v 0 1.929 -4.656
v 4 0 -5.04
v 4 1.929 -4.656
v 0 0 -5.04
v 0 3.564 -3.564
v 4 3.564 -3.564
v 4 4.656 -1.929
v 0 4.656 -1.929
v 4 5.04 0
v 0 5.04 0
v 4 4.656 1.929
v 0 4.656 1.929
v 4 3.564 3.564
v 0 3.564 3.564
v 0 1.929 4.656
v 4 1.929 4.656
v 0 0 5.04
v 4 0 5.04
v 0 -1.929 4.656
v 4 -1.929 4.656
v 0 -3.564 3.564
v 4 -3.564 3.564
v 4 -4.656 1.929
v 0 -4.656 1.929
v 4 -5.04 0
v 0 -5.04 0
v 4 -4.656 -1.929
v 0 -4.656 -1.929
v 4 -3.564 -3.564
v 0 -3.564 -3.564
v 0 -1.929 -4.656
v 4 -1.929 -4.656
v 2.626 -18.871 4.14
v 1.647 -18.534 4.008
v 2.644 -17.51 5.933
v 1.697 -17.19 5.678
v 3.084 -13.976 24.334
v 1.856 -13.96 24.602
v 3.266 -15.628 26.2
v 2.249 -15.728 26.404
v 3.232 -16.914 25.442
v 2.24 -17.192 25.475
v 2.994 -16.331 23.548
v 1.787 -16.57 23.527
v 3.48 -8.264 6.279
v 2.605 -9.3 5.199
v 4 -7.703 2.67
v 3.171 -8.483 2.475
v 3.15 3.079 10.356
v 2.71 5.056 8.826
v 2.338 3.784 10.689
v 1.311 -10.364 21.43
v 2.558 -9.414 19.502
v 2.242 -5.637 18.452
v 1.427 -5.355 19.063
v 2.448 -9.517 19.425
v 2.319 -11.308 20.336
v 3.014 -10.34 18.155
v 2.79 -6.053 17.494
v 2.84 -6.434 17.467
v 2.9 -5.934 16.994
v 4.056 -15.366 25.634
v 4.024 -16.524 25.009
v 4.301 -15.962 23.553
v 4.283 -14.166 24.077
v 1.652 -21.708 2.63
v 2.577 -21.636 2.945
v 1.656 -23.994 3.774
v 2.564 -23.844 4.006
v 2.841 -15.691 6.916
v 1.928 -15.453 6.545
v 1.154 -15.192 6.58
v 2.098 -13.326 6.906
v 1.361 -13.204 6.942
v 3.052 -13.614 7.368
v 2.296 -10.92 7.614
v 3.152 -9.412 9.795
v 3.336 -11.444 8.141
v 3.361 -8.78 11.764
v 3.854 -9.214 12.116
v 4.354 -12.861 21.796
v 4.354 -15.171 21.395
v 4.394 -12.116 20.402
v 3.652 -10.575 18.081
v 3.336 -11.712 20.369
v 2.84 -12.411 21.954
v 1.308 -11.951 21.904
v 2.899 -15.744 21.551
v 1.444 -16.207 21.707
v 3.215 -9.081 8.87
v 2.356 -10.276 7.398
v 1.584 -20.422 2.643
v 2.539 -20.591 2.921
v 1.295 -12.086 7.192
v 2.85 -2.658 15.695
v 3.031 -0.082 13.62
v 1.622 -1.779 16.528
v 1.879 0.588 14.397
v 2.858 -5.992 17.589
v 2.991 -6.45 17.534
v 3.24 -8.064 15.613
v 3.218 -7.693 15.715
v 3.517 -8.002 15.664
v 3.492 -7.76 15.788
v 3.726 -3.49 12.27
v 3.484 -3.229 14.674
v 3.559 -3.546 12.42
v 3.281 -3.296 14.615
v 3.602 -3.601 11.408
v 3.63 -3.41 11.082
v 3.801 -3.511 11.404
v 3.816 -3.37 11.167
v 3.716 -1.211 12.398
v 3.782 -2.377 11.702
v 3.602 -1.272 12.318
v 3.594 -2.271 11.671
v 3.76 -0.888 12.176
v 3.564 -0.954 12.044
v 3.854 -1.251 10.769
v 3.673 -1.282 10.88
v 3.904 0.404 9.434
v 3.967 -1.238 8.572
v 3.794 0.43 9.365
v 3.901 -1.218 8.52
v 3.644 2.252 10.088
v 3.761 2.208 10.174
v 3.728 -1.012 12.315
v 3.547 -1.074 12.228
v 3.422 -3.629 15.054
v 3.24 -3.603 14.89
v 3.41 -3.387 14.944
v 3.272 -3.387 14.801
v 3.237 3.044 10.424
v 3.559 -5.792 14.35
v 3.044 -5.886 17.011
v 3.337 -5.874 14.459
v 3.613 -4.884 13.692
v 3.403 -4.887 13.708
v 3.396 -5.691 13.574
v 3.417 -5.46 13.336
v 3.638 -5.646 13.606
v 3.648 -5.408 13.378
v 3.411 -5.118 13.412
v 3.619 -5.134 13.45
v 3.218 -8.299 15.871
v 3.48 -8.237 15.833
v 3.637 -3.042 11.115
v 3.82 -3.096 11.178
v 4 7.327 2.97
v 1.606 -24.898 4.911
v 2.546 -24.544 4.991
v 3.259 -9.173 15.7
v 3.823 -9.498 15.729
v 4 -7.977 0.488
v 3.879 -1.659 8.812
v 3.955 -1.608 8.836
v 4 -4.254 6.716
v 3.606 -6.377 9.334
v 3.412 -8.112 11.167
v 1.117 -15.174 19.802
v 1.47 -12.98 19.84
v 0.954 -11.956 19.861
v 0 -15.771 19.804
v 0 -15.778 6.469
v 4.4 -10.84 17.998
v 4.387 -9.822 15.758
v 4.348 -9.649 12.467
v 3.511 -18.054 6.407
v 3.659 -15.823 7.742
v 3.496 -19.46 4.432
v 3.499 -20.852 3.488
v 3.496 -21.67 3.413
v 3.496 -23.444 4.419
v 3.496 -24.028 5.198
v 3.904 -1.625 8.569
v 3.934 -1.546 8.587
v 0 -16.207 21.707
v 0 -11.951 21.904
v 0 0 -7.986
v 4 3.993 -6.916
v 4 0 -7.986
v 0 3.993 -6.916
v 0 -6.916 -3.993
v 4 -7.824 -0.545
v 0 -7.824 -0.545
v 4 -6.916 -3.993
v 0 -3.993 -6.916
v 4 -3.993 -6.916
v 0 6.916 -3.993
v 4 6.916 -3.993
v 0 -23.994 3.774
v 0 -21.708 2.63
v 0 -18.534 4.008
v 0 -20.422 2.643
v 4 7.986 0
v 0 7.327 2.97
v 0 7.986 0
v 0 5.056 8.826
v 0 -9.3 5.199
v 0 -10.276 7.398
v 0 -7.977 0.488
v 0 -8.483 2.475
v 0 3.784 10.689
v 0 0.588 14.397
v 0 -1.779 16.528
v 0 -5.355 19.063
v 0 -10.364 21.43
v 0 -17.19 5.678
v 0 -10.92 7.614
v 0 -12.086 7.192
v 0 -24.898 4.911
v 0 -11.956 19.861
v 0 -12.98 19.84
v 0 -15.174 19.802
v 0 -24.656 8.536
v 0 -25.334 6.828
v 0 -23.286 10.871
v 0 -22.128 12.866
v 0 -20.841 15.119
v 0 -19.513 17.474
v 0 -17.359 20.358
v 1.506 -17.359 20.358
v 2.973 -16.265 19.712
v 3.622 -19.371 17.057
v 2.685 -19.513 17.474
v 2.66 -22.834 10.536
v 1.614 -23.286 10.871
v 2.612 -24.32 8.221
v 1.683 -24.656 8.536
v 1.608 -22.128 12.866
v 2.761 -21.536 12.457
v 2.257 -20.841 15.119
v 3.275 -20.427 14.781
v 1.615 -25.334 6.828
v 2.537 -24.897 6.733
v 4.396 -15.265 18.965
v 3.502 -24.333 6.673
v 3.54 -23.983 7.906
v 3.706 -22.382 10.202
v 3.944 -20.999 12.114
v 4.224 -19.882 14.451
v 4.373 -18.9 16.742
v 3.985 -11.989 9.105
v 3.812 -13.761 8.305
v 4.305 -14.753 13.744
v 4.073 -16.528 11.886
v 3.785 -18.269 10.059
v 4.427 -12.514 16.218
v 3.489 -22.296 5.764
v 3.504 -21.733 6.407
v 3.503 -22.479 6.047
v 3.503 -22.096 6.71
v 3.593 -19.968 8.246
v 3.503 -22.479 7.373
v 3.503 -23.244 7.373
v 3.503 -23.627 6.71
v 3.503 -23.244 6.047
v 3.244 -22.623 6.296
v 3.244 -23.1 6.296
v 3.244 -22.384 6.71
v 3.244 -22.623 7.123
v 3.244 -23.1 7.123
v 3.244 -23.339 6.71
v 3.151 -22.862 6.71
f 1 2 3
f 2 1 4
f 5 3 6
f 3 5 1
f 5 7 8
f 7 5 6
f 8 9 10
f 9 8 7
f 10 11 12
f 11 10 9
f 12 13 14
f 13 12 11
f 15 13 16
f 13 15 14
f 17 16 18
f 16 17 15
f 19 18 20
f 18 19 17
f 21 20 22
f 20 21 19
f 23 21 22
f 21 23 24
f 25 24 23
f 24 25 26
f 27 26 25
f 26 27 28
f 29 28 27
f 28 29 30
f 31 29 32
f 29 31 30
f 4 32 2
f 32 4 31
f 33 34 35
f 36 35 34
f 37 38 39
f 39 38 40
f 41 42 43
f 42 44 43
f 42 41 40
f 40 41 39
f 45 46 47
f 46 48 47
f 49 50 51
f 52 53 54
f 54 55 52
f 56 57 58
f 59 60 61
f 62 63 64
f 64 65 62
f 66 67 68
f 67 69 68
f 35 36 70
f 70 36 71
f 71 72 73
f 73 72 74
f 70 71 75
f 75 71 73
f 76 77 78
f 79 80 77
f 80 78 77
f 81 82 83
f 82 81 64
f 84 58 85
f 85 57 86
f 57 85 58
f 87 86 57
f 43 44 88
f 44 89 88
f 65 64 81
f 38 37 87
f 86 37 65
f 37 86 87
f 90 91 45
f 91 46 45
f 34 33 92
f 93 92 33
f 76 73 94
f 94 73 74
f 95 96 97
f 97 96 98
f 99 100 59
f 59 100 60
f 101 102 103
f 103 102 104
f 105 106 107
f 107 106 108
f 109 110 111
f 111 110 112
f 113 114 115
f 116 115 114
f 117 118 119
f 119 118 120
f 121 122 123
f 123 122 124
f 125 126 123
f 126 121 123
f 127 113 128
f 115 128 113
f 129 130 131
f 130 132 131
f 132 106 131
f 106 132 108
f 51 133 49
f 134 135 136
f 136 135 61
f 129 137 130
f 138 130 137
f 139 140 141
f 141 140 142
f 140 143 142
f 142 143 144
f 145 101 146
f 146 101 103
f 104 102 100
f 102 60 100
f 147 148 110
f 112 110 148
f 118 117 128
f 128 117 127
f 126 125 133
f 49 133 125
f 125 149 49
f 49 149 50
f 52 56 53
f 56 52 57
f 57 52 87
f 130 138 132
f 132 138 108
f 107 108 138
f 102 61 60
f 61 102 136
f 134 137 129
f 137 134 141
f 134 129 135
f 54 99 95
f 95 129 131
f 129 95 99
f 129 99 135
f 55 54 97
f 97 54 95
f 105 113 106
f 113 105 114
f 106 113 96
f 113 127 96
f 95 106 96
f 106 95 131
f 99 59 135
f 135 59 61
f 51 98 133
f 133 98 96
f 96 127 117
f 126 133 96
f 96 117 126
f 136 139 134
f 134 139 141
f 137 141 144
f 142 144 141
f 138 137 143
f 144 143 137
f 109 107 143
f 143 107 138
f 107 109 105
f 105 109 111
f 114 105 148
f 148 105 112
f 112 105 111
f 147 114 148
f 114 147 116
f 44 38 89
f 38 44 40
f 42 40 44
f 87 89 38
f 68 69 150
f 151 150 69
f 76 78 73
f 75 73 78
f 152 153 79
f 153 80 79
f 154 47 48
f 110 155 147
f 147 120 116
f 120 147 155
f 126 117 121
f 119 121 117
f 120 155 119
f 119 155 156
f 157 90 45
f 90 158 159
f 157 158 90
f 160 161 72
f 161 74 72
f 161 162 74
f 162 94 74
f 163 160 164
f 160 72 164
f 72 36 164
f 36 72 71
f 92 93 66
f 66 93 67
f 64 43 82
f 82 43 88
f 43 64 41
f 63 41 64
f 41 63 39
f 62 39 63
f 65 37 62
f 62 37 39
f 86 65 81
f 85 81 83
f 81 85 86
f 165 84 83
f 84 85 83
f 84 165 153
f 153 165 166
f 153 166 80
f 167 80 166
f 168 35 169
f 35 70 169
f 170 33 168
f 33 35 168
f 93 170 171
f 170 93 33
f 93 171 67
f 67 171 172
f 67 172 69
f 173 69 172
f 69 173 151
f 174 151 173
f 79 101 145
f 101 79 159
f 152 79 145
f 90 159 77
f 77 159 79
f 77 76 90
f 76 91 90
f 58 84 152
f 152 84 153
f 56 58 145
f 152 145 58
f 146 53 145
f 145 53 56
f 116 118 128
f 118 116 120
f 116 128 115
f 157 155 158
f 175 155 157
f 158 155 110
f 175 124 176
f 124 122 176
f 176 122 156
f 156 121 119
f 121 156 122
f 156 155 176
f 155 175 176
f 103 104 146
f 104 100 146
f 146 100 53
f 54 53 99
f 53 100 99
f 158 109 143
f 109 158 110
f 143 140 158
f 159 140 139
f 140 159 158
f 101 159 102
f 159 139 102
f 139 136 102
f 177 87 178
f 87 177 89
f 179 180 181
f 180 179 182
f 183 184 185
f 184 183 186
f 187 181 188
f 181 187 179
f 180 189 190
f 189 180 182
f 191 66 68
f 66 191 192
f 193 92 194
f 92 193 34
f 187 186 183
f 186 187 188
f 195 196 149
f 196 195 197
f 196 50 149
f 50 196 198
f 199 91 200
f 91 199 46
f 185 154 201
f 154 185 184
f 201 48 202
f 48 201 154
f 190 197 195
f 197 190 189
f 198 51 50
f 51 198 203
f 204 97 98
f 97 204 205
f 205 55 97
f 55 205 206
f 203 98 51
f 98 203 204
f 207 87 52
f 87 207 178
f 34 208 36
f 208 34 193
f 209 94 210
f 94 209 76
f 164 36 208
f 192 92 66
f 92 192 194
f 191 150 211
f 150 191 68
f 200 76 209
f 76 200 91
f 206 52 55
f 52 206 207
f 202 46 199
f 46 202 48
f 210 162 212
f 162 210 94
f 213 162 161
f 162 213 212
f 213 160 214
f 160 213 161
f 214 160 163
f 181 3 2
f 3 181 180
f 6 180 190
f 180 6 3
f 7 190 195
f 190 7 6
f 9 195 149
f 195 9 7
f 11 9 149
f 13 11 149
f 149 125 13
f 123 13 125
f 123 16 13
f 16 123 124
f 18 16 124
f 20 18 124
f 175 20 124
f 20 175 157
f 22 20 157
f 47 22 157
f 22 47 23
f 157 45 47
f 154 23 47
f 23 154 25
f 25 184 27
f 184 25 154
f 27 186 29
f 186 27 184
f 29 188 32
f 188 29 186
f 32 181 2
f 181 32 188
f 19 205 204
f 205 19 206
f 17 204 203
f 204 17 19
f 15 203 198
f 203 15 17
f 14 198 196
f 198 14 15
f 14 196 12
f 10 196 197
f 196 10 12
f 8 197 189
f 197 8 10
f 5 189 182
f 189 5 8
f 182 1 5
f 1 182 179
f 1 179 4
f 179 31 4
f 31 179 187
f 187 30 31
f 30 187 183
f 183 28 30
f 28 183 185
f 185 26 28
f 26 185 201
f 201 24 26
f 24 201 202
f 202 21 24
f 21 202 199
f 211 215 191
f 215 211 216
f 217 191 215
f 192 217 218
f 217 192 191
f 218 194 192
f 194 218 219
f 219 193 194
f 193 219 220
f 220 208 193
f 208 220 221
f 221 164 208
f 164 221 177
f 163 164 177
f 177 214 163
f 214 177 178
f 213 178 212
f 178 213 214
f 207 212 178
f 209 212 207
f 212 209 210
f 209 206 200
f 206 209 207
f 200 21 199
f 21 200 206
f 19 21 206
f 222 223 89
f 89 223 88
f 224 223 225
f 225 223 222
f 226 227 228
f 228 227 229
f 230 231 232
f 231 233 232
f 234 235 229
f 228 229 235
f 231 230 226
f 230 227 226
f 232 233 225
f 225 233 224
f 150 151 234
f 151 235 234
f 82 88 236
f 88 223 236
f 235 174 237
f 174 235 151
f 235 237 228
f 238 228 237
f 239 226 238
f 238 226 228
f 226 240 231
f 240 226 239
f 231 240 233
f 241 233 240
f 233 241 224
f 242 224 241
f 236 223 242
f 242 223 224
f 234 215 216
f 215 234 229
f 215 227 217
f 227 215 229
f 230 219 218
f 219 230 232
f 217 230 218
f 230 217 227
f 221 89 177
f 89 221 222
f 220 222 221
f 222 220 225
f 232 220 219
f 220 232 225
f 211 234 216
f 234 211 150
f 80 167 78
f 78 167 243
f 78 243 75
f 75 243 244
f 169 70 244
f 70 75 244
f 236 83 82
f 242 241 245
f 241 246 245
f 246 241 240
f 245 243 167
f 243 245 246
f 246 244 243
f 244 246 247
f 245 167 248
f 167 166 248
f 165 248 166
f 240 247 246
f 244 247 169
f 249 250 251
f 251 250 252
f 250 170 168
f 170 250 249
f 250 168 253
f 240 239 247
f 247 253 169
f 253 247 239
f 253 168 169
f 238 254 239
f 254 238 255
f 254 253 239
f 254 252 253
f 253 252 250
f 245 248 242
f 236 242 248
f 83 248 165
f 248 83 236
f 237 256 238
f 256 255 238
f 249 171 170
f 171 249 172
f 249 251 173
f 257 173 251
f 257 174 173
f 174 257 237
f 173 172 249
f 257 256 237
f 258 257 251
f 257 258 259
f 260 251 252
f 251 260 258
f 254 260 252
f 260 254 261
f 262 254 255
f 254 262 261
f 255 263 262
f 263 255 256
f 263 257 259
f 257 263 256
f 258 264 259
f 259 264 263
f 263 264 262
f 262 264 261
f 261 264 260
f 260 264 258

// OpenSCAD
use <../lib.scad>
use <s/10350s01.scad>
function ldraw_lib__10350() = [
// 0 ~Animal Horse Poseable Head Left
// 0 Name: 10350.dat
// 0 Author: Philippe Hurbain [Philo]
// 0 !LDRAW_ORG Part UPDATE 2013-02
// 0 !LICENSE Licensed under CC BY 4.0 : see CAreadme.txt
// 
// 0 BFC CERTIFY CCW
  [0,"BFC","CERTIFY"],
  [0,"BFC","CCW"],
// 
// 0 !HISTORY 2013-11-18 {LEGO Digital Designer} Original part shape
// 0 !HISTORY 2013-11-18 [Philo] File preparation for LDraw Parts Tracker
// 0 !HISTORY 2013-12-23 [PTadmin] Official Update 2013-02
// 
// 
// 1 16 0 0 0 1 0 0 0 1 0 0 0 1 s\10350s01.dat
  [1,16,0,0,0,1,0,0,0,1,0,0,0,1, ldraw_lib__s__10350s01()],
// 0 // Patternable areas
// 0 // Head Top
// 3 16 3.764 -50.896 -43.398 7.433 -49.279 -40.662 3.61 -54.268 -40.518
  [3,16,3.764,-50.896,-43.398,7.433,-49.279,-40.662,3.61,-54.268,-40.518],
// 3 16 3.61 -54.268 -40.518 7.433 -49.279 -40.662 7.247 -53.878 -39.361
  [3,16,3.61,-54.268,-40.518,7.433,-49.279,-40.662,7.247,-53.878,-39.361],
// 3 16 9.054 -42.642 -48.427 7.433 -49.279 -40.662 6.713 -43.686 -48.782
  [3,16,9.054,-42.642,-48.427,7.433,-49.279,-40.662,6.713,-43.686,-48.782],
// 3 16 6.713 -43.686 -48.782 7.433 -49.279 -40.662 3.764 -50.896 -43.398
  [3,16,6.713,-43.686,-48.782,7.433,-49.279,-40.662,3.764,-50.896,-43.398],
// 3 16 6.65 -26.341 -57.085 4.036 -27.178 -58.214 6.53 -20.552 -60.799
  [3,16,6.65,-26.341,-57.085,4.036,-27.178,-58.214,6.53,-20.552,-60.799],
// 3 16 6.53 -20.552 -60.799 4.036 -27.178 -58.214 4.208 -21.339 -61.641
  [3,16,6.53,-20.552,-60.799,4.036,-27.178,-58.214,4.208,-21.339,-61.641],
// 3 16 4.02 -32.164 -55.32 6.902 -31.143 -53.84 5.642 -37.797 -52.103
  [3,16,4.02,-32.164,-55.32,6.902,-31.143,-53.84,5.642,-37.797,-52.103],
// 3 16 6.902 -31.143 -53.84 8.187 -36.952 -51.068 5.642 -37.797 -52.103
  [3,16,6.902,-31.143,-53.84,8.187,-36.952,-51.068,5.642,-37.797,-52.103],
// 3 16 4.037 -17.07 -63.336 6.342 -16.832 -62.243 4.208 -21.339 -61.641
  [3,16,4.037,-17.07,-63.336,6.342,-16.832,-62.243,4.208,-21.339,-61.641],
// 3 16 6.53 -20.552 -60.799 4.208 -21.339 -61.641 6.342 -16.832 -62.243
  [3,16,6.53,-20.552,-60.799,4.208,-21.339,-61.641,6.342,-16.832,-62.243],
// 3 16 6.902 -31.143 -53.84 4.02 -32.164 -55.32 6.65 -26.341 -57.085
  [3,16,6.902,-31.143,-53.84,4.02,-32.164,-55.32,6.65,-26.341,-57.085],
// 3 16 4.02 -32.164 -55.32 4.036 -27.178 -58.214 6.65 -26.341 -57.085
  [3,16,4.02,-32.164,-55.32,4.036,-27.178,-58.214,6.65,-26.341,-57.085],
// 3 16 5.642 -37.797 -52.103 8.187 -36.952 -51.068 6.713 -43.686 -48.782
  [3,16,5.642,-37.797,-52.103,8.187,-36.952,-51.068,6.713,-43.686,-48.782],
// 3 16 6.713 -43.686 -48.782 8.187 -36.952 -51.068 9.054 -42.642 -48.427
  [3,16,6.713,-43.686,-48.782,8.187,-36.952,-51.068,9.054,-42.642,-48.427],
// 3 16 4.015 -12.278 -62.245 6.366 -12.477 -61.36 4.037 -17.07 -63.336
  [3,16,4.015,-12.278,-62.245,6.366,-12.477,-61.36,4.037,-17.07,-63.336],
// 3 16 6.366 -12.477 -61.36 6.342 -16.832 -62.243 4.037 -17.07 -63.336
  [3,16,6.366,-12.477,-61.36,6.342,-16.832,-62.243,4.037,-17.07,-63.336],
// 3 16 10.884 -53.488 -37.927 7.247 -53.878 -39.361 10.99 -47.412 -38.163
  [3,16,10.884,-53.488,-37.927,7.247,-53.878,-39.361,10.99,-47.412,-38.163],
// 3 16 7.247 -53.878 -39.361 7.433 -49.279 -40.662 10.99 -47.412 -38.163
  [3,16,7.247,-53.878,-39.361,7.433,-49.279,-40.662,10.99,-47.412,-38.163],
// 4 16 6.342 -16.832 -62.243 6.366 -12.477 -61.36 8.74 -12.994 -60.071 8.754 -16.683 -60.832
  [4,16,6.342,-16.832,-62.243,6.366,-12.477,-61.36,8.74,-12.994,-60.071,8.754,-16.683,-60.832],
// 3 16 6.342 -16.832 -62.243 8.754 -16.683 -60.832 6.53 -20.552 -60.799
  [3,16,6.342,-16.832,-62.243,8.754,-16.683,-60.832,6.53,-20.552,-60.799],
// 3 16 8.851 -19.764 -59.957 6.53 -20.552 -60.799 8.754 -16.683 -60.832
  [3,16,8.851,-19.764,-59.957,6.53,-20.552,-60.799,8.754,-16.683,-60.832],
// 3 16 9.264 -25.505 -55.956 6.65 -26.341 -57.085 8.851 -19.764 -59.957
  [3,16,9.264,-25.505,-55.956,6.65,-26.341,-57.085,8.851,-19.764,-59.957],
// 3 16 8.851 -19.764 -59.957 6.65 -26.341 -57.085 6.53 -20.552 -60.799
  [3,16,8.851,-19.764,-59.957,6.65,-26.341,-57.085,6.53,-20.552,-60.799],
// 4 16 9.264 -25.505 -55.956 9.859 -30.285 -52.497 6.902 -31.143 -53.84 6.65 -26.341 -57.085
  [4,16,9.264,-25.505,-55.956,9.859,-30.285,-52.497,6.902,-31.143,-53.84,6.65,-26.341,-57.085],
// 3 16 6.902 -31.143 -53.84 9.859 -30.285 -52.497 8.187 -36.952 -51.068
  [3,16,6.902,-31.143,-53.84,9.859,-30.285,-52.497,8.187,-36.952,-51.068],
// 3 16 10.56 -36.128 -49.704 8.187 -36.952 -51.068 9.859 -30.285 -52.497
  [3,16,10.56,-36.128,-49.704,8.187,-36.952,-51.068,9.859,-30.285,-52.497],
// 3 16 8.187 -36.952 -51.068 10.56 -36.128 -49.704 9.054 -42.642 -48.427
  [3,16,8.187,-36.952,-51.068,10.56,-36.128,-49.704,9.054,-42.642,-48.427],
// 3 16 10.933 -41.854 -47.251 9.054 -42.642 -48.427 10.56 -36.128 -49.704
  [3,16,10.933,-41.854,-47.251,9.054,-42.642,-48.427,10.56,-36.128,-49.704],
// 3 16 10.99 -47.412 -38.163 7.433 -49.279 -40.662 10.933 -41.854 -47.251
  [3,16,10.99,-47.412,-38.163,7.433,-49.279,-40.662,10.933,-41.854,-47.251],
// 3 16 10.933 -41.854 -47.251 7.433 -49.279 -40.662 9.054 -42.642 -48.427
  [3,16,10.933,-41.854,-47.251,7.433,-49.279,-40.662,9.054,-42.642,-48.427],
// 2 24 3.61 -54.268 -40.518 3.764 -50.896 -43.398
  [2,24,3.61,-54.268,-40.518,3.764,-50.896,-43.398],
// 2 24 3.764 -50.896 -43.398 6.713 -43.686 -48.782
  [2,24,3.764,-50.896,-43.398,6.713,-43.686,-48.782],
// 2 24 4.02 -32.164 -55.32 5.642 -37.797 -52.103
  [2,24,4.02,-32.164,-55.32,5.642,-37.797,-52.103],
// 2 24 6.713 -43.686 -48.782 5.642 -37.797 -52.103
  [2,24,6.713,-43.686,-48.782,5.642,-37.797,-52.103],
// 4 16 0 -17.07 -63.336 4.037 -17.07 -63.336 4.208 -21.339 -61.641 0 -21.339 -61.641
  [4,16,0,-17.07,-63.336,4.037,-17.07,-63.336,4.208,-21.339,-61.641,0,-21.339,-61.641],
// 4 16 0 -21.339 -61.641 4.208 -21.339 -61.641 4.036 -27.178 -58.214 0 -27.178 -58.214
  [4,16,0,-21.339,-61.641,4.208,-21.339,-61.641,4.036,-27.178,-58.214,0,-27.178,-58.214],
// 4 16 0 -32.164 -55.32 4.02 -32.164 -55.32 5.642 -37.797 -52.103 0 -37.797 -52.103
  [4,16,0,-32.164,-55.32,4.02,-32.164,-55.32,5.642,-37.797,-52.103,0,-37.797,-52.103],
// 4 16 0 -27.178 -58.214 4.036 -27.178 -58.214 4.02 -32.164 -55.32 0 -32.164 -55.32
  [4,16,0,-27.178,-58.214,4.036,-27.178,-58.214,4.02,-32.164,-55.32,0,-32.164,-55.32],
// 4 16 0 -50.896 -43.398 3.764 -50.896 -43.398 3.61 -54.268 -40.518 0 -54.268 -40.518
  [4,16,0,-50.896,-43.398,3.764,-50.896,-43.398,3.61,-54.268,-40.518,0,-54.268,-40.518],
// 4 16 0 -43.686 -48.782 6.713 -43.686 -48.782 3.764 -50.896 -43.398 0 -50.896 -43.398
  [4,16,0,-43.686,-48.782,6.713,-43.686,-48.782,3.764,-50.896,-43.398,0,-50.896,-43.398],
// 4 16 0 -37.797 -52.103 5.642 -37.797 -52.103 6.713 -43.686 -48.782 0 -43.686 -48.782
  [4,16,0,-37.797,-52.103,5.642,-37.797,-52.103,6.713,-43.686,-48.782,0,-43.686,-48.782],
// 4 16 0 -12.278 -62.245 4.015 -12.278 -62.245 4.037 -17.07 -63.336 0 -17.07 -63.336
  [4,16,0,-12.278,-62.245,4.015,-12.278,-62.245,4.037,-17.07,-63.336,0,-17.07,-63.336],
// 5 24 3.764 -50.896 -43.398 7.433 -49.279 -40.662 3.61 -54.268 -40.518 6.713 -43.686 -48.782
  [5,24,3.764,-50.896,-43.398,7.433,-49.279,-40.662,3.61,-54.268,-40.518,6.713,-43.686,-48.782],
// 5 24 7.433 -49.279 -40.662 3.61 -54.268 -40.518 3.764 -50.896 -43.398 7.247 -53.878 -39.361
  [5,24,7.433,-49.279,-40.662,3.61,-54.268,-40.518,3.764,-50.896,-43.398,7.247,-53.878,-39.361],
// 5 24 7.433 -49.279 -40.662 7.247 -53.878 -39.361 3.61 -54.268 -40.518 10.99 -47.412 -38.163
  [5,24,7.433,-49.279,-40.662,7.247,-53.878,-39.361,3.61,-54.268,-40.518,10.99,-47.412,-38.163],
// 5 24 9.054 -42.642 -48.427 7.433 -49.279 -40.662 6.713 -43.686 -48.782 10.933 -41.854 -47.251
  [5,24,9.054,-42.642,-48.427,7.433,-49.279,-40.662,6.713,-43.686,-48.782,10.933,-41.854,-47.251],
// 5 24 7.433 -49.279 -40.662 6.713 -43.686 -48.782 9.054 -42.642 -48.427 3.764 -50.896 -43.398
  [5,24,7.433,-49.279,-40.662,6.713,-43.686,-48.782,9.054,-42.642,-48.427,3.764,-50.896,-43.398],
// 5 24 6.713 -43.686 -48.782 9.054 -42.642 -48.427 7.433 -49.279 -40.662 8.187 -36.952 -51.068
  [5,24,6.713,-43.686,-48.782,9.054,-42.642,-48.427,7.433,-49.279,-40.662,8.187,-36.952,-51.068],
// 5 24 6.65 -26.341 -57.085 4.036 -27.178 -58.214 6.53 -20.552 -60.799 4.02 -32.164 -55.32
  [5,24,6.65,-26.341,-57.085,4.036,-27.178,-58.214,6.53,-20.552,-60.799,4.02,-32.164,-55.32],
// 5 24 4.036 -27.178 -58.214 6.53 -20.552 -60.799 6.65 -26.341 -57.085 4.208 -21.339 -61.641
  [5,24,4.036,-27.178,-58.214,6.53,-20.552,-60.799,6.65,-26.341,-57.085,4.208,-21.339,-61.641],
// 5 24 6.53 -20.552 -60.799 6.65 -26.341 -57.085 4.036 -27.178 -58.214 8.851 -19.764 -59.957
  [5,24,6.53,-20.552,-60.799,6.65,-26.341,-57.085,4.036,-27.178,-58.214,8.851,-19.764,-59.957],
// 5 24 4.036 -27.178 -58.214 4.208 -21.339 -61.641 6.53 -20.552 -60.799 0 -21.339 -61.641
  [5,24,4.036,-27.178,-58.214,4.208,-21.339,-61.641,6.53,-20.552,-60.799,0,-21.339,-61.641],
// 5 24 4.208 -21.339 -61.641 6.53 -20.552 -60.799 4.036 -27.178 -58.214 6.342 -16.832 -62.243
  [5,24,4.208,-21.339,-61.641,6.53,-20.552,-60.799,4.036,-27.178,-58.214,6.342,-16.832,-62.243],
// 5 24 4.02 -32.164 -55.32 6.902 -31.143 -53.84 5.642 -37.797 -52.103 6.65 -26.341 -57.085
  [5,24,4.02,-32.164,-55.32,6.902,-31.143,-53.84,5.642,-37.797,-52.103,6.65,-26.341,-57.085],
// 5 24 6.902 -31.143 -53.84 5.642 -37.797 -52.103 4.02 -32.164 -55.32 8.187 -36.952 -51.068
  [5,24,6.902,-31.143,-53.84,5.642,-37.797,-52.103,4.02,-32.164,-55.32,8.187,-36.952,-51.068],
// 5 24 6.902 -31.143 -53.84 8.187 -36.952 -51.068 5.642 -37.797 -52.103 9.859 -30.285 -52.497
  [5,24,6.902,-31.143,-53.84,8.187,-36.952,-51.068,5.642,-37.797,-52.103,9.859,-30.285,-52.497],
// 5 24 8.187 -36.952 -51.068 5.642 -37.797 -52.103 6.902 -31.143 -53.84 6.713 -43.686 -48.782
  [5,24,8.187,-36.952,-51.068,5.642,-37.797,-52.103,6.902,-31.143,-53.84,6.713,-43.686,-48.782],
// 5 24 4.037 -17.07 -63.336 6.342 -16.832 -62.243 4.208 -21.339 -61.641 6.366 -12.477 -61.36
  [5,24,4.037,-17.07,-63.336,6.342,-16.832,-62.243,4.208,-21.339,-61.641,6.366,-12.477,-61.36],
// 5 24 6.342 -16.832 -62.243 4.208 -21.339 -61.641 4.037 -17.07 -63.336 6.53 -20.552 -60.799
  [5,24,6.342,-16.832,-62.243,4.208,-21.339,-61.641,4.037,-17.07,-63.336,6.53,-20.552,-60.799],
// 5 24 4.208 -21.339 -61.641 4.037 -17.07 -63.336 6.342 -16.832 -62.243 0 -17.07 -63.336
  [5,24,4.208,-21.339,-61.641,4.037,-17.07,-63.336,6.342,-16.832,-62.243,0,-17.07,-63.336],
// 5 24 6.342 -16.832 -62.243 6.53 -20.552 -60.799 4.208 -21.339 -61.641 8.754 -16.683 -60.832
  [5,24,6.342,-16.832,-62.243,6.53,-20.552,-60.799,4.208,-21.339,-61.641,8.754,-16.683,-60.832],
// 5 24 4.02 -32.164 -55.32 6.65 -26.341 -57.085 6.902 -31.143 -53.84 4.036 -27.178 -58.214
  [5,24,4.02,-32.164,-55.32,6.65,-26.341,-57.085,6.902,-31.143,-53.84,4.036,-27.178,-58.214],
// 5 24 6.65 -26.341 -57.085 6.902 -31.143 -53.84 4.02 -32.164 -55.32 9.264 -25.505 -55.956
  [5,24,6.65,-26.341,-57.085,6.902,-31.143,-53.84,4.02,-32.164,-55.32,9.264,-25.505,-55.956],
// 5 24 4.02 -32.164 -55.32 4.036 -27.178 -58.214 6.65 -26.341 -57.085 0 -27.178 -58.214
  [5,24,4.02,-32.164,-55.32,4.036,-27.178,-58.214,6.65,-26.341,-57.085,0,-27.178,-58.214],
// 5 24 8.187 -36.952 -51.068 6.713 -43.686 -48.782 5.642 -37.797 -52.103 9.054 -42.642 -48.427
  [5,24,8.187,-36.952,-51.068,6.713,-43.686,-48.782,5.642,-37.797,-52.103,9.054,-42.642,-48.427],
// 5 24 8.187 -36.952 -51.068 9.054 -42.642 -48.427 6.713 -43.686 -48.782 10.56 -36.128 -49.704
  [5,24,8.187,-36.952,-51.068,9.054,-42.642,-48.427,6.713,-43.686,-48.782,10.56,-36.128,-49.704],
// 5 24 6.366 -12.477 -61.36 4.037 -17.07 -63.336 4.015 -12.278 -62.245 6.342 -16.832 -62.243
  [5,24,6.366,-12.477,-61.36,4.037,-17.07,-63.336,4.015,-12.278,-62.245,6.342,-16.832,-62.243],
// 5 24 4.037 -17.07 -63.336 4.015 -12.278 -62.245 6.366 -12.477 -61.36 0 -12.278 -62.245
  [5,24,4.037,-17.07,-63.336,4.015,-12.278,-62.245,6.366,-12.477,-61.36,0,-12.278,-62.245],
// 5 24 6.366 -12.477 -61.36 6.342 -16.832 -62.243 4.037 -17.07 -63.336 8.74 -12.994 -60.071
  [5,24,6.366,-12.477,-61.36,6.342,-16.832,-62.243,4.037,-17.07,-63.336,8.74,-12.994,-60.071],
// 5 24 7.247 -53.878 -39.361 10.99 -47.412 -38.163 10.884 -53.488 -37.927 7.433 -49.279 -40.662
  [5,24,7.247,-53.878,-39.361,10.99,-47.412,-38.163,10.884,-53.488,-37.927,7.433,-49.279,-40.662],
// 5 24 7.433 -49.279 -40.662 10.99 -47.412 -38.163 7.247 -53.878 -39.361 10.933 -41.854 -47.251
  [5,24,7.433,-49.279,-40.662,10.99,-47.412,-38.163,7.247,-53.878,-39.361,10.933,-41.854,-47.251],
// 5 24 8.754 -16.683 -60.832 6.342 -16.832 -62.243 8.74 -12.994 -60.071 6.53 -20.552 -60.799
  [5,24,8.754,-16.683,-60.832,6.342,-16.832,-62.243,8.74,-12.994,-60.071,6.53,-20.552,-60.799],
// 5 24 8.754 -16.683 -60.832 6.53 -20.552 -60.799 6.342 -16.832 -62.243 8.851 -19.764 -59.957
  [5,24,8.754,-16.683,-60.832,6.53,-20.552,-60.799,6.342,-16.832,-62.243,8.851,-19.764,-59.957],
// 5 24 8.851 -19.764 -59.957 6.53 -20.552 -60.799 8.754 -16.683 -60.832 6.65 -26.341 -57.085
  [5,24,8.851,-19.764,-59.957,6.53,-20.552,-60.799,8.754,-16.683,-60.832,6.65,-26.341,-57.085],
// 5 24 9.264 -25.505 -55.956 6.65 -26.341 -57.085 8.851 -19.764 -59.957 6.902 -31.143 -53.84
  [5,24,9.264,-25.505,-55.956,6.65,-26.341,-57.085,8.851,-19.764,-59.957,6.902,-31.143,-53.84],
// 5 24 6.65 -26.341 -57.085 8.851 -19.764 -59.957 9.264 -25.505 -55.956 6.53 -20.552 -60.799
  [5,24,6.65,-26.341,-57.085,8.851,-19.764,-59.957,9.264,-25.505,-55.956,6.53,-20.552,-60.799],
// 5 24 9.859 -30.285 -52.497 6.902 -31.143 -53.84 9.264 -25.505 -55.956 8.187 -36.952 -51.068
  [5,24,9.859,-30.285,-52.497,6.902,-31.143,-53.84,9.264,-25.505,-55.956,8.187,-36.952,-51.068],
// 5 24 9.859 -30.285 -52.497 8.187 -36.952 -51.068 6.902 -31.143 -53.84 10.56 -36.128 -49.704
  [5,24,9.859,-30.285,-52.497,8.187,-36.952,-51.068,6.902,-31.143,-53.84,10.56,-36.128,-49.704],
// 5 24 10.56 -36.128 -49.704 8.187 -36.952 -51.068 9.859 -30.285 -52.497 9.054 -42.642 -48.427
  [5,24,10.56,-36.128,-49.704,8.187,-36.952,-51.068,9.859,-30.285,-52.497,9.054,-42.642,-48.427],
// 5 24 10.56 -36.128 -49.704 9.054 -42.642 -48.427 8.187 -36.952 -51.068 10.933 -41.854 -47.251
  [5,24,10.56,-36.128,-49.704,9.054,-42.642,-48.427,8.187,-36.952,-51.068,10.933,-41.854,-47.251],
// 5 24 10.933 -41.854 -47.251 9.054 -42.642 -48.427 10.56 -36.128 -49.704 7.433 -49.279 -40.662
  [5,24,10.933,-41.854,-47.251,9.054,-42.642,-48.427,10.56,-36.128,-49.704,7.433,-49.279,-40.662],
// 5 24 7.433 -49.279 -40.662 10.933 -41.854 -47.251 10.99 -47.412 -38.163 9.054 -42.642 -48.427
  [5,24,7.433,-49.279,-40.662,10.933,-41.854,-47.251,10.99,-47.412,-38.163,9.054,-42.642,-48.427],
// 5 24 0 -17.07 -63.336 4.037 -17.07 -63.336 4.208 -21.339 -61.641 0 -12.278 -62.245
  [5,24,0,-17.07,-63.336,4.037,-17.07,-63.336,4.208,-21.339,-61.641,0,-12.278,-62.245],
// 5 24 4.208 -21.339 -61.641 0 -21.339 -61.641 0 -17.07 -63.336 4.036 -27.178 -58.214
  [5,24,4.208,-21.339,-61.641,0,-21.339,-61.641,0,-17.07,-63.336,4.036,-27.178,-58.214],
// 5 24 4.036 -27.178 -58.214 0 -27.178 -58.214 0 -21.339 -61.641 4.02 -32.164 -55.32
  [5,24,4.036,-27.178,-58.214,0,-27.178,-58.214,0,-21.339,-61.641,4.02,-32.164,-55.32],
// 5 24 0 -32.164 -55.32 4.02 -32.164 -55.32 5.642 -37.797 -52.103 0 -27.178 -58.214
  [5,24,0,-32.164,-55.32,4.02,-32.164,-55.32,5.642,-37.797,-52.103,0,-27.178,-58.214],
// 5 24 5.642 -37.797 -52.103 0 -37.797 -52.103 0 -32.164 -55.32 6.713 -43.686 -48.782
  [5,24,5.642,-37.797,-52.103,0,-37.797,-52.103,0,-32.164,-55.32,6.713,-43.686,-48.782],
// 5 24 0 -50.896 -43.398 3.764 -50.896 -43.398 3.61 -54.268 -40.518 0 -43.686 -48.782
  [5,24,0,-50.896,-43.398,3.764,-50.896,-43.398,3.61,-54.268,-40.518,0,-43.686,-48.782],
// 5 24 0 -43.686 -48.782 6.713 -43.686 -48.782 3.764 -50.896 -43.398 0 -37.797 -52.103
  [5,24,0,-43.686,-48.782,6.713,-43.686,-48.782,3.764,-50.896,-43.398,0,-37.797,-52.103],
// 
// 0 // Head bottom
// 3 16 9.636 -30.289 -23.036 10.869 -31.168 -24.123 8.34 -20.352 -28.61
  [3,16,9.636,-30.289,-23.036,10.869,-31.168,-24.123,8.34,-20.352,-28.61],
// 3 16 8.34 -20.352 -28.61 10.869 -31.168 -24.123 9.962 -22.762 -29.973
  [3,16,8.34,-20.352,-28.61,10.869,-31.168,-24.123,9.962,-22.762,-29.973],
// 3 16 8.34 -20.352 -28.61 9.962 -22.762 -29.973 7.629 -18.421 -34.034
  [3,16,8.34,-20.352,-28.61,9.962,-22.762,-29.973,7.629,-18.421,-34.034],
// 3 16 7.629 -18.421 -34.034 9.962 -22.762 -29.973 9.531 -20.762 -34.402
  [3,16,7.629,-18.421,-34.034,9.962,-22.762,-29.973,9.531,-20.762,-34.402],
// 3 16 9.148 -19.354 -39.557 7.102 -17.291 -39.227 9.531 -20.762 -34.402
  [3,16,9.148,-19.354,-39.557,7.102,-17.291,-39.227,9.531,-20.762,-34.402],
// 3 16 7.102 -17.291 -39.227 7.629 -18.421 -34.034 9.531 -20.762 -34.402
  [3,16,7.102,-17.291,-39.227,7.629,-18.421,-34.034,9.531,-20.762,-34.402],
// 5 24 10.869 -31.168 -24.123 8.34 -20.352 -28.61 9.636 -30.289 -23.036 9.962 -22.762 -29.973
  [5,24,10.869,-31.168,-24.123,8.34,-20.352,-28.61,9.636,-30.289,-23.036,9.962,-22.762,-29.973],
// 5 24 9.962 -22.762 -29.973 8.34 -20.352 -28.61 10.869 -31.168 -24.123 7.629 -18.421 -34.034
  [5,24,9.962,-22.762,-29.973,8.34,-20.352,-28.61,10.869,-31.168,-24.123,7.629,-18.421,-34.034],
// 5 24 9.962 -22.762 -29.973 7.629 -18.421 -34.034 8.34 -20.352 -28.61 9.531 -20.762 -34.402
  [5,24,9.962,-22.762,-29.973,7.629,-18.421,-34.034,8.34,-20.352,-28.61,9.531,-20.762,-34.402],
// 5 24 9.531 -20.762 -34.402 7.629 -18.421 -34.034 9.962 -22.762 -29.973 7.102 -17.291 -39.227
  [5,24,9.531,-20.762,-34.402,7.629,-18.421,-34.034,9.962,-22.762,-29.973,7.102,-17.291,-39.227],
// 5 24 7.102 -17.291 -39.227 9.531 -20.762 -34.402 9.148 -19.354 -39.557 7.629 -18.421 -34.034
  [5,24,7.102,-17.291,-39.227,9.531,-20.762,-34.402,9.148,-19.354,-39.557,7.629,-18.421,-34.034],
// 
// 0 // Head side
// 3 16 10.99 -47.412 -38.163 10.986 -51.004 -30.291 10.884 -53.488 -37.927
  [3,16,10.99,-47.412,-38.163,10.986,-51.004,-30.291,10.884,-53.488,-37.927],
// 3 16 10.933 -41.854 -47.251 10.56 -36.128 -49.704 10.762 -34.359 -36.882
  [3,16,10.933,-41.854,-47.251,10.56,-36.128,-49.704,10.762,-34.359,-36.882],
// 4 16 10.183 -29.714 -41.321 10.762 -34.359 -36.882 10.56 -36.128 -49.704 9.859 -30.285 -52.497
  [4,16,10.183,-29.714,-41.321,10.762,-34.359,-36.882,10.56,-36.128,-49.704,9.859,-30.285,-52.497],
// 4 16 10.762 -34.359 -36.882 10.183 -29.714 -41.321 9.962 -22.762 -29.973 10.869 -31.168 -24.123
  [4,16,10.762,-34.359,-36.882,10.183,-29.714,-41.321,9.962,-22.762,-29.973,10.869,-31.168,-24.123],
// 4 16 9.531 -20.762 -34.402 9.962 -22.762 -29.973 10.183 -29.714 -41.321 9.462 -25.147 -45.672
  [4,16,9.531,-20.762,-34.402,9.962,-22.762,-29.973,10.183,-29.714,-41.321,9.462,-25.147,-45.672],
// 3 16 10.762 -34.359 -36.882 10.869 -31.168 -24.123 11.067 -40.544 -31.285
  [3,16,10.762,-34.359,-36.882,10.869,-31.168,-24.123,11.067,-40.544,-31.285],
// 3 16 10.869 -31.168 -24.123 10.967 -39.395 -24.556 11.067 -40.544 -31.285
  [3,16,10.869,-31.168,-24.123,10.967,-39.395,-24.556,11.067,-40.544,-31.285],
// 3 16 10.999 -44.996 -27.099 11.067 -40.544 -31.285 10.967 -39.395 -24.556
  [3,16,10.999,-44.996,-27.099,11.067,-40.544,-31.285,10.967,-39.395,-24.556],
// 3 16 9.859 -30.285 -52.497 9.462 -25.147 -45.672 10.183 -29.714 -41.321
  [3,16,9.859,-30.285,-52.497,9.462,-25.147,-45.672,10.183,-29.714,-41.321],
// 3 16 9.531 -20.762 -34.402 9.462 -25.147 -45.672 9.148 -19.354 -39.557
  [3,16,9.531,-20.762,-34.402,9.462,-25.147,-45.672,9.148,-19.354,-39.557],
// 3 16 8.723 -14.409 -55.741 8.759 -16.018 -54.333 8.758 -15.118 -56.197
  [3,16,8.723,-14.409,-55.741,8.759,-16.018,-54.333,8.758,-15.118,-56.197],
// 3 16 8.758 -15.118 -56.197 8.759 -16.018 -54.333 8.758 -16.775 -55.241
  [3,16,8.758,-15.118,-56.197,8.759,-16.018,-54.333,8.758,-16.775,-55.241],
// 4 16 8.74 -11.081 -48.651 8.777 -16.017 -45.135 8.759 -16.018 -54.333 8.723 -14.409 -55.741
  [4,16,8.74,-11.081,-48.651,8.777,-16.017,-45.135,8.759,-16.018,-54.333,8.723,-14.409,-55.741],
// 3 16 8.759 -16.018 -54.333 8.777 -16.017 -45.135 8.982 -20.616 -49.921
  [3,16,8.759,-16.018,-54.333,8.777,-16.017,-45.135,8.982,-20.616,-49.921],
// 3 16 9.859 -30.285 -52.497 9.264 -25.505 -55.956 9.462 -25.147 -45.672
  [3,16,9.859,-30.285,-52.497,9.264,-25.505,-55.956,9.462,-25.147,-45.672],
// 4 16 9.462 -25.147 -45.672 9.264 -25.505 -55.956 8.982 -20.616 -49.921 9.148 -19.354 -39.557
  [4,16,9.462,-25.147,-45.672,9.264,-25.505,-55.956,8.982,-20.616,-49.921,9.148,-19.354,-39.557],
// 3 16 8.982 -20.616 -49.921 8.777 -16.017 -45.135 9.148 -19.354 -39.557
  [3,16,8.982,-20.616,-49.921,8.777,-16.017,-45.135,9.148,-19.354,-39.557],
// 4 16 9.264 -25.505 -55.956 8.851 -19.764 -59.957 8.758 -18.432 -58.111 8.758 -18.432 -56.197
  [4,16,9.264,-25.505,-55.956,8.851,-19.764,-59.957,8.758,-18.432,-58.111,8.758,-18.432,-56.197],
// 3 16 8.758 -18.432 -56.197 8.982 -20.616 -49.921 9.264 -25.505 -55.956
  [3,16,8.758,-18.432,-56.197,8.982,-20.616,-49.921,9.264,-25.505,-55.956],
// 3 16 8.758 -18.432 -56.197 8.758 -16.775 -55.241 8.982 -20.616 -49.921
  [3,16,8.758,-18.432,-56.197,8.758,-16.775,-55.241,8.982,-20.616,-49.921],
// 3 16 8.982 -20.616 -49.921 8.758 -16.775 -55.241 8.759 -16.018 -54.333
  [3,16,8.982,-20.616,-49.921,8.758,-16.775,-55.241,8.759,-16.018,-54.333],
// 3 16 10.762 -34.359 -36.882 11.067 -40.544 -31.285 10.933 -41.854 -47.251
  [3,16,10.762,-34.359,-36.882,11.067,-40.544,-31.285,10.933,-41.854,-47.251],
// 3 16 10.99 -47.412 -38.163 10.933 -41.854 -47.251 11.067 -40.544 -31.285
  [3,16,10.99,-47.412,-38.163,10.933,-41.854,-47.251,11.067,-40.544,-31.285],
// 4 16 10.99 -47.412 -38.163 11.067 -40.544 -31.285 10.999 -44.996 -27.099 10.986 -51.004 -30.291
  [4,16,10.99,-47.412,-38.163,11.067,-40.544,-31.285,10.999,-44.996,-27.099,10.986,-51.004,-30.291],
// 3 16 8.754 -16.683 -60.832 8.758 -16.775 -59.068 8.851 -19.764 -59.957
  [3,16,8.754,-16.683,-60.832,8.758,-16.775,-59.068,8.851,-19.764,-59.957],
// 3 16 8.758 -16.775 -59.068 8.758 -18.432 -58.111 8.851 -19.764 -59.957
  [3,16,8.758,-16.775,-59.068,8.758,-18.432,-58.111,8.851,-19.764,-59.957],
// 4 16 8.747 -8.719 -52.131 8.74 -11.081 -48.651 8.723 -14.409 -55.741 8.739 -8.532 -54.175
  [4,16,8.747,-8.719,-52.131,8.74,-11.081,-48.651,8.723,-14.409,-55.741,8.739,-8.532,-54.175],
// 3 16 8.723 -14.409 -55.741 8.758 -15.118 -56.197 8.739 -11.048 -58.611
  [3,16,8.723,-14.409,-55.741,8.758,-15.118,-56.197,8.739,-11.048,-58.611],
// 3 16 8.758 -15.118 -58.111 8.739 -11.048 -58.611 8.758 -15.118 -56.197
  [3,16,8.758,-15.118,-58.111,8.739,-11.048,-58.611,8.758,-15.118,-56.197],
// 4 16 8.74 -12.994 -60.071 8.739 -11.048 -58.611 8.758 -15.118 -58.111 8.754 -16.683 -60.832
  [4,16,8.74,-12.994,-60.071,8.739,-11.048,-58.611,8.758,-15.118,-58.111,8.754,-16.683,-60.832],
// 3 16 8.739 -11.048 -58.611 8.739 -8.532 -54.175 8.723 -14.409 -55.741
  [3,16,8.739,-11.048,-58.611,8.739,-8.532,-54.175,8.723,-14.409,-55.741],
// 3 16 8.758 -15.118 -58.111 8.758 -16.775 -59.068 8.754 -16.683 -60.832
  [3,16,8.758,-15.118,-58.111,8.758,-16.775,-59.068,8.754,-16.683,-60.832],
// 4 16 8.758 -15.118 -58.111 8.758 -15.118 -56.197 8.11 -15.741 -56.557 8.11 -15.741 -57.751
  [4,16,8.758,-15.118,-58.111,8.758,-15.118,-56.197,8.11,-15.741,-56.557,8.11,-15.741,-57.751],
// 4 16 8.758 -15.118 -56.197 8.758 -16.775 -55.241 8.11 -16.775 -55.96 8.11 -15.741 -56.557
  [4,16,8.758,-15.118,-56.197,8.758,-16.775,-55.241,8.11,-16.775,-55.96,8.11,-15.741,-56.557],
// 4 16 8.758 -16.775 -55.241 8.758 -18.432 -56.197 8.11 -17.808 -56.557 8.11 -16.775 -55.96
  [4,16,8.758,-16.775,-55.241,8.758,-18.432,-56.197,8.11,-17.808,-56.557,8.11,-16.775,-55.96],
// 4 16 8.758 -18.432 -56.197 8.758 -18.432 -58.111 8.11 -17.808 -57.751 8.11 -17.808 -56.557
  [4,16,8.758,-18.432,-56.197,8.758,-18.432,-58.111,8.11,-17.808,-57.751,8.11,-17.808,-56.557],
// 4 16 8.758 -18.432 -58.111 8.758 -16.775 -59.068 8.11 -16.775 -58.348 8.11 -17.808 -57.751
  [4,16,8.758,-18.432,-58.111,8.758,-16.775,-59.068,8.11,-16.775,-58.348,8.11,-17.808,-57.751],
// 4 16 8.758 -16.775 -59.068 8.758 -15.118 -58.111 8.11 -15.741 -57.751 8.11 -16.775 -58.348
  [4,16,8.758,-16.775,-59.068,8.758,-15.118,-58.111,8.11,-15.741,-57.751,8.11,-16.775,-58.348],
// 3 16 8.11 -15.741 -56.557 7.877 -16.775 -57.154 8.11 -15.741 -57.751
  [3,16,8.11,-15.741,-56.557,7.877,-16.775,-57.154,8.11,-15.741,-57.751],
// 3 16 8.11 -15.741 -57.751 7.877 -16.775 -57.154 8.11 -16.775 -58.348
  [3,16,8.11,-15.741,-57.751,7.877,-16.775,-57.154,8.11,-16.775,-58.348],
// 3 16 8.11 -16.775 -58.348 7.877 -16.775 -57.154 8.11 -17.808 -57.751
  [3,16,8.11,-16.775,-58.348,7.877,-16.775,-57.154,8.11,-17.808,-57.751],
// 3 16 8.11 -17.808 -57.751 7.877 -16.775 -57.154 8.11 -17.808 -56.557
  [3,16,8.11,-17.808,-57.751,7.877,-16.775,-57.154,8.11,-17.808,-56.557],
// 3 16 8.11 -17.808 -56.557 7.877 -16.775 -57.154 8.11 -16.775 -55.96
  [3,16,8.11,-17.808,-56.557,7.877,-16.775,-57.154,8.11,-16.775,-55.96],
// 3 16 8.11 -16.775 -55.96 7.877 -16.775 -57.154 8.11 -15.741 -56.557
  [3,16,8.11,-16.775,-55.96,7.877,-16.775,-57.154,8.11,-15.741,-56.557],
// 5 24 10.99 -47.412 -38.163 10.986 -51.004 -30.291 10.884 -53.488 -37.927 10.999 -44.996 -27.099
  [5,24,10.99,-47.412,-38.163,10.986,-51.004,-30.291,10.884,-53.488,-37.927,10.999,-44.996,-27.099],
// 2 24 10.884 -53.488 -37.927 10.99 -47.412 -38.163
  [2,24,10.884,-53.488,-37.927,10.99,-47.412,-38.163],
// 2 24 10.933 -41.854 -47.251 10.56 -36.128 -49.704
  [2,24,10.933,-41.854,-47.251,10.56,-36.128,-49.704],
// 5 24 10.56 -36.128 -49.704 10.762 -34.359 -36.882 10.933 -41.854 -47.251 10.183 -29.714 -41.321
  [5,24,10.56,-36.128,-49.704,10.762,-34.359,-36.882,10.933,-41.854,-47.251,10.183,-29.714,-41.321],
// 5 24 10.762 -34.359 -36.882 10.933 -41.854 -47.251 10.56 -36.128 -49.704 11.067 -40.544 -31.285
  [5,24,10.762,-34.359,-36.882,10.933,-41.854,-47.251,10.56,-36.128,-49.704,11.067,-40.544,-31.285],
// 5 24 10.183 -29.714 -41.321 10.762 -34.359 -36.882 10.56 -36.128 -49.704 9.962 -22.762 -29.973
  [5,24,10.183,-29.714,-41.321,10.762,-34.359,-36.882,10.56,-36.128,-49.704,9.962,-22.762,-29.973],
// 5 24 10.183 -29.714 -41.321 9.962 -22.762 -29.973 10.762 -34.359 -36.882 9.531 -20.762 -34.402
  [5,24,10.183,-29.714,-41.321,9.962,-22.762,-29.973,10.762,-34.359,-36.882,9.531,-20.762,-34.402],
// 2 24 9.531 -20.762 -34.402 9.962 -22.762 -29.973
  [2,24,9.531,-20.762,-34.402,9.962,-22.762,-29.973],
// 2 24 9.962 -22.762 -29.973 10.869 -31.168 -24.123
  [2,24,9.962,-22.762,-29.973,10.869,-31.168,-24.123],
// 5 24 10.869 -31.168 -24.123 10.762 -34.359 -36.882 9.962 -22.762 -29.973 11.067 -40.544 -31.285
  [5,24,10.869,-31.168,-24.123,10.762,-34.359,-36.882,9.962,-22.762,-29.973,11.067,-40.544,-31.285],
// 5 24 10.869 -31.168 -24.123 11.067 -40.544 -31.285 10.762 -34.359 -36.882 10.967 -39.395 -24.556
  [5,24,10.869,-31.168,-24.123,11.067,-40.544,-31.285,10.762,-34.359,-36.882,10.967,-39.395,-24.556],
// 5 24 11.067 -40.544 -31.285 10.762 -34.359 -36.882 10.869 -31.168 -24.123 10.933 -41.854 -47.251
  [5,24,11.067,-40.544,-31.285,10.762,-34.359,-36.882,10.869,-31.168,-24.123,10.933,-41.854,-47.251],
// 5 24 10.967 -39.395 -24.556 11.067 -40.544 -31.285 10.869 -31.168 -24.123 10.999 -44.996 -27.099
  [5,24,10.967,-39.395,-24.556,11.067,-40.544,-31.285,10.869,-31.168,-24.123,10.999,-44.996,-27.099],
// 5 24 10.999 -44.996 -27.099 11.067 -40.544 -31.285 10.967 -39.395 -24.556 10.99 -47.412 -38.163
  [5,24,10.999,-44.996,-27.099,11.067,-40.544,-31.285,10.967,-39.395,-24.556,10.99,-47.412,-38.163],
// 2 24 10.56 -36.128 -49.704 9.859 -30.285 -52.497
  [2,24,10.56,-36.128,-49.704,9.859,-30.285,-52.497],
// 5 24 9.859 -30.285 -52.497 10.183 -29.714 -41.321 10.56 -36.128 -49.704 9.462 -25.147 -45.672
  [5,24,9.859,-30.285,-52.497,10.183,-29.714,-41.321,10.56,-36.128,-49.704,9.462,-25.147,-45.672],
// 5 24 9.859 -30.285 -52.497 9.462 -25.147 -45.672 10.183 -29.714 -41.321 9.264 -25.505 -55.956
  [5,24,9.859,-30.285,-52.497,9.462,-25.147,-45.672,10.183,-29.714,-41.321,9.264,-25.505,-55.956],
// 5 24 9.462 -25.147 -45.672 10.183 -29.714 -41.321 9.859 -30.285 -52.497 9.531 -20.762 -34.402
  [5,24,9.462,-25.147,-45.672,10.183,-29.714,-41.321,9.859,-30.285,-52.497,9.531,-20.762,-34.402],
// 5 24 9.462 -25.147 -45.672 9.531 -20.762 -34.402 10.183 -29.714 -41.321 9.148 -19.354 -39.557
  [5,24,9.462,-25.147,-45.672,9.531,-20.762,-34.402,10.183,-29.714,-41.321,9.148,-19.354,-39.557],
// 5 24 9.462 -25.147 -45.672 9.148 -19.354 -39.557 9.531 -20.762 -34.402 8.982 -20.616 -49.921
  [5,24,9.462,-25.147,-45.672,9.148,-19.354,-39.557,9.531,-20.762,-34.402,8.982,-20.616,-49.921],
// 2 24 9.148 -19.354 -39.557 9.531 -20.762 -34.402
  [2,24,9.148,-19.354,-39.557,9.531,-20.762,-34.402],
// 5 24 8.723 -14.409 -55.741 8.759 -16.018 -54.333 8.758 -15.118 -56.197 8.74 -11.081 -48.651
  [5,24,8.723,-14.409,-55.741,8.759,-16.018,-54.333,8.758,-15.118,-56.197,8.74,-11.081,-48.651],
// 5 24 8.759 -16.018 -54.333 8.758 -15.118 -56.197 8.723 -14.409 -55.741 8.758 -16.775 -55.241
  [5,24,8.759,-16.018,-54.333,8.758,-15.118,-56.197,8.723,-14.409,-55.741,8.758,-16.775,-55.241],
// 5 24 8.758 -15.118 -56.197 8.723 -14.409 -55.741 8.759 -16.018 -54.333 8.739 -11.048 -58.611
  [5,24,8.758,-15.118,-56.197,8.723,-14.409,-55.741,8.759,-16.018,-54.333,8.739,-11.048,-58.611],
// 5 24 8.759 -16.018 -54.333 8.758 -16.775 -55.241 8.758 -15.118 -56.197 8.982 -20.616 -49.921
  [5,24,8.759,-16.018,-54.333,8.758,-16.775,-55.241,8.758,-15.118,-56.197,8.982,-20.616,-49.921],
// 2 24 8.758 -16.775 -55.241 8.758 -15.118 -56.197
  [2,24,8.758,-16.775,-55.241,8.758,-15.118,-56.197],
// 5 24 8.777 -16.017 -45.135 8.759 -16.018 -54.333 8.74 -11.081 -48.651 8.982 -20.616 -49.921
  [5,24,8.777,-16.017,-45.135,8.759,-16.018,-54.333,8.74,-11.081,-48.651,8.982,-20.616,-49.921],
// 5 24 8.777 -16.017 -45.135 8.982 -20.616 -49.921 8.759 -16.018 -54.333 9.148 -19.354 -39.557
  [5,24,8.777,-16.017,-45.135,8.982,-20.616,-49.921,8.759,-16.018,-54.333,9.148,-19.354,-39.557],
// 5 24 8.982 -20.616 -49.921 8.759 -16.018 -54.333 8.777 -16.017 -45.135 8.758 -16.775 -55.241
  [5,24,8.982,-20.616,-49.921,8.759,-16.018,-54.333,8.777,-16.017,-45.135,8.758,-16.775,-55.241],
// 2 24 9.859 -30.285 -52.497 9.264 -25.505 -55.956
  [2,24,9.859,-30.285,-52.497,9.264,-25.505,-55.956],
// 5 24 9.264 -25.505 -55.956 9.462 -25.147 -45.672 9.859 -30.285 -52.497 8.982 -20.616 -49.921
  [5,24,9.264,-25.505,-55.956,9.462,-25.147,-45.672,9.859,-30.285,-52.497,8.982,-20.616,-49.921],
// 5 24 9.264 -25.505 -55.956 8.982 -20.616 -49.921 9.462 -25.147 -45.672 8.758 -18.432 -56.197
  [5,24,9.264,-25.505,-55.956,8.982,-20.616,-49.921,9.462,-25.147,-45.672,8.758,-18.432,-56.197],
// 5 24 8.982 -20.616 -49.921 9.148 -19.354 -39.557 9.462 -25.147 -45.672 8.777 -16.017 -45.135
  [5,24,8.982,-20.616,-49.921,9.148,-19.354,-39.557,9.462,-25.147,-45.672,8.777,-16.017,-45.135],
// 5 24 8.851 -19.764 -59.957 8.758 -18.432 -58.111 9.264 -25.505 -55.956 8.758 -16.775 -59.068
  [5,24,8.851,-19.764,-59.957,8.758,-18.432,-58.111,9.264,-25.505,-55.956,8.758,-16.775,-59.068],
// 2 24 9.264 -25.505 -55.956 8.851 -19.764 -59.957
  [2,24,9.264,-25.505,-55.956,8.851,-19.764,-59.957],
// 5 24 8.758 -18.432 -56.197 9.264 -25.505 -55.956 8.758 -18.432 -58.111 8.982 -20.616 -49.921
  [5,24,8.758,-18.432,-56.197,9.264,-25.505,-55.956,8.758,-18.432,-58.111,8.982,-20.616,-49.921],
// 2 24 8.758 -18.432 -58.111 8.758 -18.432 -56.197
  [2,24,8.758,-18.432,-58.111,8.758,-18.432,-56.197],
// 5 24 8.758 -18.432 -56.197 8.982 -20.616 -49.921 9.264 -25.505 -55.956 8.758 -16.775 -55.241
  [5,24,8.758,-18.432,-56.197,8.982,-20.616,-49.921,9.264,-25.505,-55.956,8.758,-16.775,-55.241],
// 2 24 8.758 -18.432 -56.197 8.758 -16.775 -55.241
  [2,24,8.758,-18.432,-56.197,8.758,-16.775,-55.241],
// 5 24 8.758 -16.775 -55.241 8.982 -20.616 -49.921 8.758 -18.432 -56.197 8.759 -16.018 -54.333
  [5,24,8.758,-16.775,-55.241,8.982,-20.616,-49.921,8.758,-18.432,-56.197,8.759,-16.018,-54.333],
// 5 24 11.067 -40.544 -31.285 10.933 -41.854 -47.251 10.762 -34.359 -36.882 10.99 -47.412 -38.163
  [5,24,11.067,-40.544,-31.285,10.933,-41.854,-47.251,10.762,-34.359,-36.882,10.99,-47.412,-38.163],
// 2 24 10.99 -47.412 -38.163 10.933 -41.854 -47.251
  [2,24,10.99,-47.412,-38.163,10.933,-41.854,-47.251],
// 5 24 11.067 -40.544 -31.285 10.99 -47.412 -38.163 10.933 -41.854 -47.251 10.999 -44.996 -27.099
  [5,24,11.067,-40.544,-31.285,10.99,-47.412,-38.163,10.933,-41.854,-47.251,10.999,-44.996,-27.099],
// 5 24 8.754 -16.683 -60.832 8.758 -16.775 -59.068 8.851 -19.764 -59.957 8.758 -15.118 -58.111
  [5,24,8.754,-16.683,-60.832,8.758,-16.775,-59.068,8.851,-19.764,-59.957,8.758,-15.118,-58.111],
// 5 24 8.758 -16.775 -59.068 8.851 -19.764 -59.957 8.754 -16.683 -60.832 8.758 -18.432 -58.111
  [5,24,8.758,-16.775,-59.068,8.851,-19.764,-59.957,8.754,-16.683,-60.832,8.758,-18.432,-58.111],
// 2 24 8.851 -19.764 -59.957 8.754 -16.683 -60.832
  [2,24,8.851,-19.764,-59.957,8.754,-16.683,-60.832],
// 2 24 8.758 -16.775 -59.068 8.758 -18.432 -58.111
  [2,24,8.758,-16.775,-59.068,8.758,-18.432,-58.111],
// 5 24 8.723 -14.409 -55.741 8.74 -11.081 -48.651 8.759 -16.018 -54.333 8.747 -8.719 -52.131
  [5,24,8.723,-14.409,-55.741,8.74,-11.081,-48.651,8.759,-16.018,-54.333,8.747,-8.719,-52.131],
// 5 24 8.758 -15.118 -56.197 8.739 -11.048 -58.611 8.723 -14.409 -55.741 8.758 -15.118 -58.111
  [5,24,8.758,-15.118,-56.197,8.739,-11.048,-58.611,8.723,-14.409,-55.741,8.758,-15.118,-58.111],
// 5 24 8.739 -11.048 -58.611 8.723 -14.409 -55.741 8.758 -15.118 -56.197 8.739 -8.532 -54.175
  [5,24,8.739,-11.048,-58.611,8.723,-14.409,-55.741,8.758,-15.118,-56.197,8.739,-8.532,-54.175],
// 5 24 8.758 -15.118 -58.111 8.739 -11.048 -58.611 8.758 -15.118 -56.197 8.74 -12.994 -60.071
  [5,24,8.758,-15.118,-58.111,8.739,-11.048,-58.611,8.758,-15.118,-56.197,8.74,-12.994,-60.071],
// 2 24 8.758 -15.118 -56.197 8.758 -15.118 -58.111
  [2,24,8.758,-15.118,-56.197,8.758,-15.118,-58.111],
// 5 24 8.739 -8.532 -54.175 8.723 -14.409 -55.741 8.739 -11.048 -58.611 8.747 -8.719 -52.131
  [5,24,8.739,-8.532,-54.175,8.723,-14.409,-55.741,8.739,-11.048,-58.611,8.747,-8.719,-52.131],
// 5 24 8.758 -15.118 -58.111 8.754 -16.683 -60.832 8.74 -12.994 -60.071 8.758 -16.775 -59.068
  [5,24,8.758,-15.118,-58.111,8.754,-16.683,-60.832,8.74,-12.994,-60.071,8.758,-16.775,-59.068],
// 2 24 8.754 -16.683 -60.832 8.74 -12.994 -60.071
  [2,24,8.754,-16.683,-60.832,8.74,-12.994,-60.071],
// 2 24 8.758 -15.118 -58.111 8.758 -16.775 -59.068
  [2,24,8.758,-15.118,-58.111,8.758,-16.775,-59.068],
// 5 24 8.758 -15.118 -56.197 8.11 -15.741 -56.557 8.758 -15.118 -58.111 8.11 -16.775 -55.96
  [5,24,8.758,-15.118,-56.197,8.11,-15.741,-56.557,8.758,-15.118,-58.111,8.11,-16.775,-55.96],
// 5 24 8.11 -15.741 -56.557 8.11 -15.741 -57.751 8.758 -15.118 -58.111 7.877 -16.775 -57.154
  [5,24,8.11,-15.741,-56.557,8.11,-15.741,-57.751,8.758,-15.118,-58.111,7.877,-16.775,-57.154],
// 5 24 8.11 -15.741 -57.751 8.758 -15.118 -58.111 8.11 -15.741 -56.557 8.758 -16.775 -59.068
  [5,24,8.11,-15.741,-57.751,8.758,-15.118,-58.111,8.11,-15.741,-56.557,8.758,-16.775,-59.068],
// 5 24 8.758 -16.775 -55.241 8.11 -16.775 -55.96 8.758 -15.118 -56.197 8.11 -17.808 -56.557
  [5,24,8.758,-16.775,-55.241,8.11,-16.775,-55.96,8.758,-15.118,-56.197,8.11,-17.808,-56.557],
// 5 24 8.11 -16.775 -55.96 8.11 -15.741 -56.557 8.758 -15.118 -56.197 7.877 -16.775 -57.154
  [5,24,8.11,-16.775,-55.96,8.11,-15.741,-56.557,8.758,-15.118,-56.197,7.877,-16.775,-57.154],
// 5 24 8.758 -18.432 -56.197 8.11 -17.808 -56.557 8.758 -16.775 -55.241 8.11 -17.808 -57.751
  [5,24,8.758,-18.432,-56.197,8.11,-17.808,-56.557,8.758,-16.775,-55.241,8.11,-17.808,-57.751],
// 5 24 8.11 -17.808 -56.557 8.11 -16.775 -55.96 8.758 -16.775 -55.241 7.877 -16.775 -57.154
  [5,24,8.11,-17.808,-56.557,8.11,-16.775,-55.96,8.758,-16.775,-55.241,7.877,-16.775,-57.154],
// 5 24 8.758 -18.432 -58.111 8.11 -17.808 -57.751 8.758 -18.432 -56.197 8.11 -16.775 -58.348
  [5,24,8.758,-18.432,-58.111,8.11,-17.808,-57.751,8.758,-18.432,-56.197,8.11,-16.775,-58.348],
// 5 24 8.11 -17.808 -57.751 8.11 -17.808 -56.557 8.758 -18.432 -56.197 7.877 -16.775 -57.154
  [5,24,8.11,-17.808,-57.751,8.11,-17.808,-56.557,8.758,-18.432,-56.197,7.877,-16.775,-57.154],
// 5 24 8.758 -16.775 -59.068 8.11 -16.775 -58.348 8.758 -18.432 -58.111 8.11 -15.741 -57.751
  [5,24,8.758,-16.775,-59.068,8.11,-16.775,-58.348,8.758,-18.432,-58.111,8.11,-15.741,-57.751],
// 5 24 8.11 -16.775 -58.348 8.11 -17.808 -57.751 8.758 -18.432 -58.111 7.877 -16.775 -57.154
  [5,24,8.11,-16.775,-58.348,8.11,-17.808,-57.751,8.758,-18.432,-58.111,7.877,-16.775,-57.154],
// 5 24 8.11 -15.741 -57.751 8.11 -16.775 -58.348 8.758 -16.775 -59.068 7.877 -16.775 -57.154
  [5,24,8.11,-15.741,-57.751,8.11,-16.775,-58.348,8.758,-16.775,-59.068,7.877,-16.775,-57.154],
// 5 24 8.11 -15.741 -56.557 7.877 -16.775 -57.154 8.11 -15.741 -57.751 8.11 -16.775 -55.96
  [5,24,8.11,-15.741,-56.557,7.877,-16.775,-57.154,8.11,-15.741,-57.751,8.11,-16.775,-55.96],
// 5 24 7.877 -16.775 -57.154 8.11 -15.741 -57.751 8.11 -15.741 -56.557 8.11 -16.775 -58.348
  [5,24,7.877,-16.775,-57.154,8.11,-15.741,-57.751,8.11,-15.741,-56.557,8.11,-16.775,-58.348],
// 5 24 7.877 -16.775 -57.154 8.11 -16.775 -58.348 8.11 -15.741 -57.751 8.11 -17.808 -57.751
  [5,24,7.877,-16.775,-57.154,8.11,-16.775,-58.348,8.11,-15.741,-57.751,8.11,-17.808,-57.751],
// 5 24 7.877 -16.775 -57.154 8.11 -17.808 -57.751 8.11 -16.775 -58.348 8.11 -17.808 -56.557
  [5,24,7.877,-16.775,-57.154,8.11,-17.808,-57.751,8.11,-16.775,-58.348,8.11,-17.808,-56.557],
// 5 24 7.877 -16.775 -57.154 8.11 -17.808 -56.557 8.11 -17.808 -57.751 8.11 -16.775 -55.96
  [5,24,7.877,-16.775,-57.154,8.11,-17.808,-56.557,8.11,-17.808,-57.751,8.11,-16.775,-55.96],
// 5 24 7.877 -16.775 -57.154 8.11 -16.775 -55.96 8.11 -17.808 -56.557 8.11 -15.741 -56.557
  [5,24,7.877,-16.775,-57.154,8.11,-16.775,-55.96,8.11,-17.808,-56.557,8.11,-15.741,-56.557],
];
module ldraw_lib__10350(step=0, col=false, unit=2/5, alt=false, line=0.2, solid=!$preview)
    makepoly(ldraw_lib__10350(), step=step, col=col, unit=unit, alt=alt, line=line, solid=solid);
ldraw_lib__10350(line=0.2);
